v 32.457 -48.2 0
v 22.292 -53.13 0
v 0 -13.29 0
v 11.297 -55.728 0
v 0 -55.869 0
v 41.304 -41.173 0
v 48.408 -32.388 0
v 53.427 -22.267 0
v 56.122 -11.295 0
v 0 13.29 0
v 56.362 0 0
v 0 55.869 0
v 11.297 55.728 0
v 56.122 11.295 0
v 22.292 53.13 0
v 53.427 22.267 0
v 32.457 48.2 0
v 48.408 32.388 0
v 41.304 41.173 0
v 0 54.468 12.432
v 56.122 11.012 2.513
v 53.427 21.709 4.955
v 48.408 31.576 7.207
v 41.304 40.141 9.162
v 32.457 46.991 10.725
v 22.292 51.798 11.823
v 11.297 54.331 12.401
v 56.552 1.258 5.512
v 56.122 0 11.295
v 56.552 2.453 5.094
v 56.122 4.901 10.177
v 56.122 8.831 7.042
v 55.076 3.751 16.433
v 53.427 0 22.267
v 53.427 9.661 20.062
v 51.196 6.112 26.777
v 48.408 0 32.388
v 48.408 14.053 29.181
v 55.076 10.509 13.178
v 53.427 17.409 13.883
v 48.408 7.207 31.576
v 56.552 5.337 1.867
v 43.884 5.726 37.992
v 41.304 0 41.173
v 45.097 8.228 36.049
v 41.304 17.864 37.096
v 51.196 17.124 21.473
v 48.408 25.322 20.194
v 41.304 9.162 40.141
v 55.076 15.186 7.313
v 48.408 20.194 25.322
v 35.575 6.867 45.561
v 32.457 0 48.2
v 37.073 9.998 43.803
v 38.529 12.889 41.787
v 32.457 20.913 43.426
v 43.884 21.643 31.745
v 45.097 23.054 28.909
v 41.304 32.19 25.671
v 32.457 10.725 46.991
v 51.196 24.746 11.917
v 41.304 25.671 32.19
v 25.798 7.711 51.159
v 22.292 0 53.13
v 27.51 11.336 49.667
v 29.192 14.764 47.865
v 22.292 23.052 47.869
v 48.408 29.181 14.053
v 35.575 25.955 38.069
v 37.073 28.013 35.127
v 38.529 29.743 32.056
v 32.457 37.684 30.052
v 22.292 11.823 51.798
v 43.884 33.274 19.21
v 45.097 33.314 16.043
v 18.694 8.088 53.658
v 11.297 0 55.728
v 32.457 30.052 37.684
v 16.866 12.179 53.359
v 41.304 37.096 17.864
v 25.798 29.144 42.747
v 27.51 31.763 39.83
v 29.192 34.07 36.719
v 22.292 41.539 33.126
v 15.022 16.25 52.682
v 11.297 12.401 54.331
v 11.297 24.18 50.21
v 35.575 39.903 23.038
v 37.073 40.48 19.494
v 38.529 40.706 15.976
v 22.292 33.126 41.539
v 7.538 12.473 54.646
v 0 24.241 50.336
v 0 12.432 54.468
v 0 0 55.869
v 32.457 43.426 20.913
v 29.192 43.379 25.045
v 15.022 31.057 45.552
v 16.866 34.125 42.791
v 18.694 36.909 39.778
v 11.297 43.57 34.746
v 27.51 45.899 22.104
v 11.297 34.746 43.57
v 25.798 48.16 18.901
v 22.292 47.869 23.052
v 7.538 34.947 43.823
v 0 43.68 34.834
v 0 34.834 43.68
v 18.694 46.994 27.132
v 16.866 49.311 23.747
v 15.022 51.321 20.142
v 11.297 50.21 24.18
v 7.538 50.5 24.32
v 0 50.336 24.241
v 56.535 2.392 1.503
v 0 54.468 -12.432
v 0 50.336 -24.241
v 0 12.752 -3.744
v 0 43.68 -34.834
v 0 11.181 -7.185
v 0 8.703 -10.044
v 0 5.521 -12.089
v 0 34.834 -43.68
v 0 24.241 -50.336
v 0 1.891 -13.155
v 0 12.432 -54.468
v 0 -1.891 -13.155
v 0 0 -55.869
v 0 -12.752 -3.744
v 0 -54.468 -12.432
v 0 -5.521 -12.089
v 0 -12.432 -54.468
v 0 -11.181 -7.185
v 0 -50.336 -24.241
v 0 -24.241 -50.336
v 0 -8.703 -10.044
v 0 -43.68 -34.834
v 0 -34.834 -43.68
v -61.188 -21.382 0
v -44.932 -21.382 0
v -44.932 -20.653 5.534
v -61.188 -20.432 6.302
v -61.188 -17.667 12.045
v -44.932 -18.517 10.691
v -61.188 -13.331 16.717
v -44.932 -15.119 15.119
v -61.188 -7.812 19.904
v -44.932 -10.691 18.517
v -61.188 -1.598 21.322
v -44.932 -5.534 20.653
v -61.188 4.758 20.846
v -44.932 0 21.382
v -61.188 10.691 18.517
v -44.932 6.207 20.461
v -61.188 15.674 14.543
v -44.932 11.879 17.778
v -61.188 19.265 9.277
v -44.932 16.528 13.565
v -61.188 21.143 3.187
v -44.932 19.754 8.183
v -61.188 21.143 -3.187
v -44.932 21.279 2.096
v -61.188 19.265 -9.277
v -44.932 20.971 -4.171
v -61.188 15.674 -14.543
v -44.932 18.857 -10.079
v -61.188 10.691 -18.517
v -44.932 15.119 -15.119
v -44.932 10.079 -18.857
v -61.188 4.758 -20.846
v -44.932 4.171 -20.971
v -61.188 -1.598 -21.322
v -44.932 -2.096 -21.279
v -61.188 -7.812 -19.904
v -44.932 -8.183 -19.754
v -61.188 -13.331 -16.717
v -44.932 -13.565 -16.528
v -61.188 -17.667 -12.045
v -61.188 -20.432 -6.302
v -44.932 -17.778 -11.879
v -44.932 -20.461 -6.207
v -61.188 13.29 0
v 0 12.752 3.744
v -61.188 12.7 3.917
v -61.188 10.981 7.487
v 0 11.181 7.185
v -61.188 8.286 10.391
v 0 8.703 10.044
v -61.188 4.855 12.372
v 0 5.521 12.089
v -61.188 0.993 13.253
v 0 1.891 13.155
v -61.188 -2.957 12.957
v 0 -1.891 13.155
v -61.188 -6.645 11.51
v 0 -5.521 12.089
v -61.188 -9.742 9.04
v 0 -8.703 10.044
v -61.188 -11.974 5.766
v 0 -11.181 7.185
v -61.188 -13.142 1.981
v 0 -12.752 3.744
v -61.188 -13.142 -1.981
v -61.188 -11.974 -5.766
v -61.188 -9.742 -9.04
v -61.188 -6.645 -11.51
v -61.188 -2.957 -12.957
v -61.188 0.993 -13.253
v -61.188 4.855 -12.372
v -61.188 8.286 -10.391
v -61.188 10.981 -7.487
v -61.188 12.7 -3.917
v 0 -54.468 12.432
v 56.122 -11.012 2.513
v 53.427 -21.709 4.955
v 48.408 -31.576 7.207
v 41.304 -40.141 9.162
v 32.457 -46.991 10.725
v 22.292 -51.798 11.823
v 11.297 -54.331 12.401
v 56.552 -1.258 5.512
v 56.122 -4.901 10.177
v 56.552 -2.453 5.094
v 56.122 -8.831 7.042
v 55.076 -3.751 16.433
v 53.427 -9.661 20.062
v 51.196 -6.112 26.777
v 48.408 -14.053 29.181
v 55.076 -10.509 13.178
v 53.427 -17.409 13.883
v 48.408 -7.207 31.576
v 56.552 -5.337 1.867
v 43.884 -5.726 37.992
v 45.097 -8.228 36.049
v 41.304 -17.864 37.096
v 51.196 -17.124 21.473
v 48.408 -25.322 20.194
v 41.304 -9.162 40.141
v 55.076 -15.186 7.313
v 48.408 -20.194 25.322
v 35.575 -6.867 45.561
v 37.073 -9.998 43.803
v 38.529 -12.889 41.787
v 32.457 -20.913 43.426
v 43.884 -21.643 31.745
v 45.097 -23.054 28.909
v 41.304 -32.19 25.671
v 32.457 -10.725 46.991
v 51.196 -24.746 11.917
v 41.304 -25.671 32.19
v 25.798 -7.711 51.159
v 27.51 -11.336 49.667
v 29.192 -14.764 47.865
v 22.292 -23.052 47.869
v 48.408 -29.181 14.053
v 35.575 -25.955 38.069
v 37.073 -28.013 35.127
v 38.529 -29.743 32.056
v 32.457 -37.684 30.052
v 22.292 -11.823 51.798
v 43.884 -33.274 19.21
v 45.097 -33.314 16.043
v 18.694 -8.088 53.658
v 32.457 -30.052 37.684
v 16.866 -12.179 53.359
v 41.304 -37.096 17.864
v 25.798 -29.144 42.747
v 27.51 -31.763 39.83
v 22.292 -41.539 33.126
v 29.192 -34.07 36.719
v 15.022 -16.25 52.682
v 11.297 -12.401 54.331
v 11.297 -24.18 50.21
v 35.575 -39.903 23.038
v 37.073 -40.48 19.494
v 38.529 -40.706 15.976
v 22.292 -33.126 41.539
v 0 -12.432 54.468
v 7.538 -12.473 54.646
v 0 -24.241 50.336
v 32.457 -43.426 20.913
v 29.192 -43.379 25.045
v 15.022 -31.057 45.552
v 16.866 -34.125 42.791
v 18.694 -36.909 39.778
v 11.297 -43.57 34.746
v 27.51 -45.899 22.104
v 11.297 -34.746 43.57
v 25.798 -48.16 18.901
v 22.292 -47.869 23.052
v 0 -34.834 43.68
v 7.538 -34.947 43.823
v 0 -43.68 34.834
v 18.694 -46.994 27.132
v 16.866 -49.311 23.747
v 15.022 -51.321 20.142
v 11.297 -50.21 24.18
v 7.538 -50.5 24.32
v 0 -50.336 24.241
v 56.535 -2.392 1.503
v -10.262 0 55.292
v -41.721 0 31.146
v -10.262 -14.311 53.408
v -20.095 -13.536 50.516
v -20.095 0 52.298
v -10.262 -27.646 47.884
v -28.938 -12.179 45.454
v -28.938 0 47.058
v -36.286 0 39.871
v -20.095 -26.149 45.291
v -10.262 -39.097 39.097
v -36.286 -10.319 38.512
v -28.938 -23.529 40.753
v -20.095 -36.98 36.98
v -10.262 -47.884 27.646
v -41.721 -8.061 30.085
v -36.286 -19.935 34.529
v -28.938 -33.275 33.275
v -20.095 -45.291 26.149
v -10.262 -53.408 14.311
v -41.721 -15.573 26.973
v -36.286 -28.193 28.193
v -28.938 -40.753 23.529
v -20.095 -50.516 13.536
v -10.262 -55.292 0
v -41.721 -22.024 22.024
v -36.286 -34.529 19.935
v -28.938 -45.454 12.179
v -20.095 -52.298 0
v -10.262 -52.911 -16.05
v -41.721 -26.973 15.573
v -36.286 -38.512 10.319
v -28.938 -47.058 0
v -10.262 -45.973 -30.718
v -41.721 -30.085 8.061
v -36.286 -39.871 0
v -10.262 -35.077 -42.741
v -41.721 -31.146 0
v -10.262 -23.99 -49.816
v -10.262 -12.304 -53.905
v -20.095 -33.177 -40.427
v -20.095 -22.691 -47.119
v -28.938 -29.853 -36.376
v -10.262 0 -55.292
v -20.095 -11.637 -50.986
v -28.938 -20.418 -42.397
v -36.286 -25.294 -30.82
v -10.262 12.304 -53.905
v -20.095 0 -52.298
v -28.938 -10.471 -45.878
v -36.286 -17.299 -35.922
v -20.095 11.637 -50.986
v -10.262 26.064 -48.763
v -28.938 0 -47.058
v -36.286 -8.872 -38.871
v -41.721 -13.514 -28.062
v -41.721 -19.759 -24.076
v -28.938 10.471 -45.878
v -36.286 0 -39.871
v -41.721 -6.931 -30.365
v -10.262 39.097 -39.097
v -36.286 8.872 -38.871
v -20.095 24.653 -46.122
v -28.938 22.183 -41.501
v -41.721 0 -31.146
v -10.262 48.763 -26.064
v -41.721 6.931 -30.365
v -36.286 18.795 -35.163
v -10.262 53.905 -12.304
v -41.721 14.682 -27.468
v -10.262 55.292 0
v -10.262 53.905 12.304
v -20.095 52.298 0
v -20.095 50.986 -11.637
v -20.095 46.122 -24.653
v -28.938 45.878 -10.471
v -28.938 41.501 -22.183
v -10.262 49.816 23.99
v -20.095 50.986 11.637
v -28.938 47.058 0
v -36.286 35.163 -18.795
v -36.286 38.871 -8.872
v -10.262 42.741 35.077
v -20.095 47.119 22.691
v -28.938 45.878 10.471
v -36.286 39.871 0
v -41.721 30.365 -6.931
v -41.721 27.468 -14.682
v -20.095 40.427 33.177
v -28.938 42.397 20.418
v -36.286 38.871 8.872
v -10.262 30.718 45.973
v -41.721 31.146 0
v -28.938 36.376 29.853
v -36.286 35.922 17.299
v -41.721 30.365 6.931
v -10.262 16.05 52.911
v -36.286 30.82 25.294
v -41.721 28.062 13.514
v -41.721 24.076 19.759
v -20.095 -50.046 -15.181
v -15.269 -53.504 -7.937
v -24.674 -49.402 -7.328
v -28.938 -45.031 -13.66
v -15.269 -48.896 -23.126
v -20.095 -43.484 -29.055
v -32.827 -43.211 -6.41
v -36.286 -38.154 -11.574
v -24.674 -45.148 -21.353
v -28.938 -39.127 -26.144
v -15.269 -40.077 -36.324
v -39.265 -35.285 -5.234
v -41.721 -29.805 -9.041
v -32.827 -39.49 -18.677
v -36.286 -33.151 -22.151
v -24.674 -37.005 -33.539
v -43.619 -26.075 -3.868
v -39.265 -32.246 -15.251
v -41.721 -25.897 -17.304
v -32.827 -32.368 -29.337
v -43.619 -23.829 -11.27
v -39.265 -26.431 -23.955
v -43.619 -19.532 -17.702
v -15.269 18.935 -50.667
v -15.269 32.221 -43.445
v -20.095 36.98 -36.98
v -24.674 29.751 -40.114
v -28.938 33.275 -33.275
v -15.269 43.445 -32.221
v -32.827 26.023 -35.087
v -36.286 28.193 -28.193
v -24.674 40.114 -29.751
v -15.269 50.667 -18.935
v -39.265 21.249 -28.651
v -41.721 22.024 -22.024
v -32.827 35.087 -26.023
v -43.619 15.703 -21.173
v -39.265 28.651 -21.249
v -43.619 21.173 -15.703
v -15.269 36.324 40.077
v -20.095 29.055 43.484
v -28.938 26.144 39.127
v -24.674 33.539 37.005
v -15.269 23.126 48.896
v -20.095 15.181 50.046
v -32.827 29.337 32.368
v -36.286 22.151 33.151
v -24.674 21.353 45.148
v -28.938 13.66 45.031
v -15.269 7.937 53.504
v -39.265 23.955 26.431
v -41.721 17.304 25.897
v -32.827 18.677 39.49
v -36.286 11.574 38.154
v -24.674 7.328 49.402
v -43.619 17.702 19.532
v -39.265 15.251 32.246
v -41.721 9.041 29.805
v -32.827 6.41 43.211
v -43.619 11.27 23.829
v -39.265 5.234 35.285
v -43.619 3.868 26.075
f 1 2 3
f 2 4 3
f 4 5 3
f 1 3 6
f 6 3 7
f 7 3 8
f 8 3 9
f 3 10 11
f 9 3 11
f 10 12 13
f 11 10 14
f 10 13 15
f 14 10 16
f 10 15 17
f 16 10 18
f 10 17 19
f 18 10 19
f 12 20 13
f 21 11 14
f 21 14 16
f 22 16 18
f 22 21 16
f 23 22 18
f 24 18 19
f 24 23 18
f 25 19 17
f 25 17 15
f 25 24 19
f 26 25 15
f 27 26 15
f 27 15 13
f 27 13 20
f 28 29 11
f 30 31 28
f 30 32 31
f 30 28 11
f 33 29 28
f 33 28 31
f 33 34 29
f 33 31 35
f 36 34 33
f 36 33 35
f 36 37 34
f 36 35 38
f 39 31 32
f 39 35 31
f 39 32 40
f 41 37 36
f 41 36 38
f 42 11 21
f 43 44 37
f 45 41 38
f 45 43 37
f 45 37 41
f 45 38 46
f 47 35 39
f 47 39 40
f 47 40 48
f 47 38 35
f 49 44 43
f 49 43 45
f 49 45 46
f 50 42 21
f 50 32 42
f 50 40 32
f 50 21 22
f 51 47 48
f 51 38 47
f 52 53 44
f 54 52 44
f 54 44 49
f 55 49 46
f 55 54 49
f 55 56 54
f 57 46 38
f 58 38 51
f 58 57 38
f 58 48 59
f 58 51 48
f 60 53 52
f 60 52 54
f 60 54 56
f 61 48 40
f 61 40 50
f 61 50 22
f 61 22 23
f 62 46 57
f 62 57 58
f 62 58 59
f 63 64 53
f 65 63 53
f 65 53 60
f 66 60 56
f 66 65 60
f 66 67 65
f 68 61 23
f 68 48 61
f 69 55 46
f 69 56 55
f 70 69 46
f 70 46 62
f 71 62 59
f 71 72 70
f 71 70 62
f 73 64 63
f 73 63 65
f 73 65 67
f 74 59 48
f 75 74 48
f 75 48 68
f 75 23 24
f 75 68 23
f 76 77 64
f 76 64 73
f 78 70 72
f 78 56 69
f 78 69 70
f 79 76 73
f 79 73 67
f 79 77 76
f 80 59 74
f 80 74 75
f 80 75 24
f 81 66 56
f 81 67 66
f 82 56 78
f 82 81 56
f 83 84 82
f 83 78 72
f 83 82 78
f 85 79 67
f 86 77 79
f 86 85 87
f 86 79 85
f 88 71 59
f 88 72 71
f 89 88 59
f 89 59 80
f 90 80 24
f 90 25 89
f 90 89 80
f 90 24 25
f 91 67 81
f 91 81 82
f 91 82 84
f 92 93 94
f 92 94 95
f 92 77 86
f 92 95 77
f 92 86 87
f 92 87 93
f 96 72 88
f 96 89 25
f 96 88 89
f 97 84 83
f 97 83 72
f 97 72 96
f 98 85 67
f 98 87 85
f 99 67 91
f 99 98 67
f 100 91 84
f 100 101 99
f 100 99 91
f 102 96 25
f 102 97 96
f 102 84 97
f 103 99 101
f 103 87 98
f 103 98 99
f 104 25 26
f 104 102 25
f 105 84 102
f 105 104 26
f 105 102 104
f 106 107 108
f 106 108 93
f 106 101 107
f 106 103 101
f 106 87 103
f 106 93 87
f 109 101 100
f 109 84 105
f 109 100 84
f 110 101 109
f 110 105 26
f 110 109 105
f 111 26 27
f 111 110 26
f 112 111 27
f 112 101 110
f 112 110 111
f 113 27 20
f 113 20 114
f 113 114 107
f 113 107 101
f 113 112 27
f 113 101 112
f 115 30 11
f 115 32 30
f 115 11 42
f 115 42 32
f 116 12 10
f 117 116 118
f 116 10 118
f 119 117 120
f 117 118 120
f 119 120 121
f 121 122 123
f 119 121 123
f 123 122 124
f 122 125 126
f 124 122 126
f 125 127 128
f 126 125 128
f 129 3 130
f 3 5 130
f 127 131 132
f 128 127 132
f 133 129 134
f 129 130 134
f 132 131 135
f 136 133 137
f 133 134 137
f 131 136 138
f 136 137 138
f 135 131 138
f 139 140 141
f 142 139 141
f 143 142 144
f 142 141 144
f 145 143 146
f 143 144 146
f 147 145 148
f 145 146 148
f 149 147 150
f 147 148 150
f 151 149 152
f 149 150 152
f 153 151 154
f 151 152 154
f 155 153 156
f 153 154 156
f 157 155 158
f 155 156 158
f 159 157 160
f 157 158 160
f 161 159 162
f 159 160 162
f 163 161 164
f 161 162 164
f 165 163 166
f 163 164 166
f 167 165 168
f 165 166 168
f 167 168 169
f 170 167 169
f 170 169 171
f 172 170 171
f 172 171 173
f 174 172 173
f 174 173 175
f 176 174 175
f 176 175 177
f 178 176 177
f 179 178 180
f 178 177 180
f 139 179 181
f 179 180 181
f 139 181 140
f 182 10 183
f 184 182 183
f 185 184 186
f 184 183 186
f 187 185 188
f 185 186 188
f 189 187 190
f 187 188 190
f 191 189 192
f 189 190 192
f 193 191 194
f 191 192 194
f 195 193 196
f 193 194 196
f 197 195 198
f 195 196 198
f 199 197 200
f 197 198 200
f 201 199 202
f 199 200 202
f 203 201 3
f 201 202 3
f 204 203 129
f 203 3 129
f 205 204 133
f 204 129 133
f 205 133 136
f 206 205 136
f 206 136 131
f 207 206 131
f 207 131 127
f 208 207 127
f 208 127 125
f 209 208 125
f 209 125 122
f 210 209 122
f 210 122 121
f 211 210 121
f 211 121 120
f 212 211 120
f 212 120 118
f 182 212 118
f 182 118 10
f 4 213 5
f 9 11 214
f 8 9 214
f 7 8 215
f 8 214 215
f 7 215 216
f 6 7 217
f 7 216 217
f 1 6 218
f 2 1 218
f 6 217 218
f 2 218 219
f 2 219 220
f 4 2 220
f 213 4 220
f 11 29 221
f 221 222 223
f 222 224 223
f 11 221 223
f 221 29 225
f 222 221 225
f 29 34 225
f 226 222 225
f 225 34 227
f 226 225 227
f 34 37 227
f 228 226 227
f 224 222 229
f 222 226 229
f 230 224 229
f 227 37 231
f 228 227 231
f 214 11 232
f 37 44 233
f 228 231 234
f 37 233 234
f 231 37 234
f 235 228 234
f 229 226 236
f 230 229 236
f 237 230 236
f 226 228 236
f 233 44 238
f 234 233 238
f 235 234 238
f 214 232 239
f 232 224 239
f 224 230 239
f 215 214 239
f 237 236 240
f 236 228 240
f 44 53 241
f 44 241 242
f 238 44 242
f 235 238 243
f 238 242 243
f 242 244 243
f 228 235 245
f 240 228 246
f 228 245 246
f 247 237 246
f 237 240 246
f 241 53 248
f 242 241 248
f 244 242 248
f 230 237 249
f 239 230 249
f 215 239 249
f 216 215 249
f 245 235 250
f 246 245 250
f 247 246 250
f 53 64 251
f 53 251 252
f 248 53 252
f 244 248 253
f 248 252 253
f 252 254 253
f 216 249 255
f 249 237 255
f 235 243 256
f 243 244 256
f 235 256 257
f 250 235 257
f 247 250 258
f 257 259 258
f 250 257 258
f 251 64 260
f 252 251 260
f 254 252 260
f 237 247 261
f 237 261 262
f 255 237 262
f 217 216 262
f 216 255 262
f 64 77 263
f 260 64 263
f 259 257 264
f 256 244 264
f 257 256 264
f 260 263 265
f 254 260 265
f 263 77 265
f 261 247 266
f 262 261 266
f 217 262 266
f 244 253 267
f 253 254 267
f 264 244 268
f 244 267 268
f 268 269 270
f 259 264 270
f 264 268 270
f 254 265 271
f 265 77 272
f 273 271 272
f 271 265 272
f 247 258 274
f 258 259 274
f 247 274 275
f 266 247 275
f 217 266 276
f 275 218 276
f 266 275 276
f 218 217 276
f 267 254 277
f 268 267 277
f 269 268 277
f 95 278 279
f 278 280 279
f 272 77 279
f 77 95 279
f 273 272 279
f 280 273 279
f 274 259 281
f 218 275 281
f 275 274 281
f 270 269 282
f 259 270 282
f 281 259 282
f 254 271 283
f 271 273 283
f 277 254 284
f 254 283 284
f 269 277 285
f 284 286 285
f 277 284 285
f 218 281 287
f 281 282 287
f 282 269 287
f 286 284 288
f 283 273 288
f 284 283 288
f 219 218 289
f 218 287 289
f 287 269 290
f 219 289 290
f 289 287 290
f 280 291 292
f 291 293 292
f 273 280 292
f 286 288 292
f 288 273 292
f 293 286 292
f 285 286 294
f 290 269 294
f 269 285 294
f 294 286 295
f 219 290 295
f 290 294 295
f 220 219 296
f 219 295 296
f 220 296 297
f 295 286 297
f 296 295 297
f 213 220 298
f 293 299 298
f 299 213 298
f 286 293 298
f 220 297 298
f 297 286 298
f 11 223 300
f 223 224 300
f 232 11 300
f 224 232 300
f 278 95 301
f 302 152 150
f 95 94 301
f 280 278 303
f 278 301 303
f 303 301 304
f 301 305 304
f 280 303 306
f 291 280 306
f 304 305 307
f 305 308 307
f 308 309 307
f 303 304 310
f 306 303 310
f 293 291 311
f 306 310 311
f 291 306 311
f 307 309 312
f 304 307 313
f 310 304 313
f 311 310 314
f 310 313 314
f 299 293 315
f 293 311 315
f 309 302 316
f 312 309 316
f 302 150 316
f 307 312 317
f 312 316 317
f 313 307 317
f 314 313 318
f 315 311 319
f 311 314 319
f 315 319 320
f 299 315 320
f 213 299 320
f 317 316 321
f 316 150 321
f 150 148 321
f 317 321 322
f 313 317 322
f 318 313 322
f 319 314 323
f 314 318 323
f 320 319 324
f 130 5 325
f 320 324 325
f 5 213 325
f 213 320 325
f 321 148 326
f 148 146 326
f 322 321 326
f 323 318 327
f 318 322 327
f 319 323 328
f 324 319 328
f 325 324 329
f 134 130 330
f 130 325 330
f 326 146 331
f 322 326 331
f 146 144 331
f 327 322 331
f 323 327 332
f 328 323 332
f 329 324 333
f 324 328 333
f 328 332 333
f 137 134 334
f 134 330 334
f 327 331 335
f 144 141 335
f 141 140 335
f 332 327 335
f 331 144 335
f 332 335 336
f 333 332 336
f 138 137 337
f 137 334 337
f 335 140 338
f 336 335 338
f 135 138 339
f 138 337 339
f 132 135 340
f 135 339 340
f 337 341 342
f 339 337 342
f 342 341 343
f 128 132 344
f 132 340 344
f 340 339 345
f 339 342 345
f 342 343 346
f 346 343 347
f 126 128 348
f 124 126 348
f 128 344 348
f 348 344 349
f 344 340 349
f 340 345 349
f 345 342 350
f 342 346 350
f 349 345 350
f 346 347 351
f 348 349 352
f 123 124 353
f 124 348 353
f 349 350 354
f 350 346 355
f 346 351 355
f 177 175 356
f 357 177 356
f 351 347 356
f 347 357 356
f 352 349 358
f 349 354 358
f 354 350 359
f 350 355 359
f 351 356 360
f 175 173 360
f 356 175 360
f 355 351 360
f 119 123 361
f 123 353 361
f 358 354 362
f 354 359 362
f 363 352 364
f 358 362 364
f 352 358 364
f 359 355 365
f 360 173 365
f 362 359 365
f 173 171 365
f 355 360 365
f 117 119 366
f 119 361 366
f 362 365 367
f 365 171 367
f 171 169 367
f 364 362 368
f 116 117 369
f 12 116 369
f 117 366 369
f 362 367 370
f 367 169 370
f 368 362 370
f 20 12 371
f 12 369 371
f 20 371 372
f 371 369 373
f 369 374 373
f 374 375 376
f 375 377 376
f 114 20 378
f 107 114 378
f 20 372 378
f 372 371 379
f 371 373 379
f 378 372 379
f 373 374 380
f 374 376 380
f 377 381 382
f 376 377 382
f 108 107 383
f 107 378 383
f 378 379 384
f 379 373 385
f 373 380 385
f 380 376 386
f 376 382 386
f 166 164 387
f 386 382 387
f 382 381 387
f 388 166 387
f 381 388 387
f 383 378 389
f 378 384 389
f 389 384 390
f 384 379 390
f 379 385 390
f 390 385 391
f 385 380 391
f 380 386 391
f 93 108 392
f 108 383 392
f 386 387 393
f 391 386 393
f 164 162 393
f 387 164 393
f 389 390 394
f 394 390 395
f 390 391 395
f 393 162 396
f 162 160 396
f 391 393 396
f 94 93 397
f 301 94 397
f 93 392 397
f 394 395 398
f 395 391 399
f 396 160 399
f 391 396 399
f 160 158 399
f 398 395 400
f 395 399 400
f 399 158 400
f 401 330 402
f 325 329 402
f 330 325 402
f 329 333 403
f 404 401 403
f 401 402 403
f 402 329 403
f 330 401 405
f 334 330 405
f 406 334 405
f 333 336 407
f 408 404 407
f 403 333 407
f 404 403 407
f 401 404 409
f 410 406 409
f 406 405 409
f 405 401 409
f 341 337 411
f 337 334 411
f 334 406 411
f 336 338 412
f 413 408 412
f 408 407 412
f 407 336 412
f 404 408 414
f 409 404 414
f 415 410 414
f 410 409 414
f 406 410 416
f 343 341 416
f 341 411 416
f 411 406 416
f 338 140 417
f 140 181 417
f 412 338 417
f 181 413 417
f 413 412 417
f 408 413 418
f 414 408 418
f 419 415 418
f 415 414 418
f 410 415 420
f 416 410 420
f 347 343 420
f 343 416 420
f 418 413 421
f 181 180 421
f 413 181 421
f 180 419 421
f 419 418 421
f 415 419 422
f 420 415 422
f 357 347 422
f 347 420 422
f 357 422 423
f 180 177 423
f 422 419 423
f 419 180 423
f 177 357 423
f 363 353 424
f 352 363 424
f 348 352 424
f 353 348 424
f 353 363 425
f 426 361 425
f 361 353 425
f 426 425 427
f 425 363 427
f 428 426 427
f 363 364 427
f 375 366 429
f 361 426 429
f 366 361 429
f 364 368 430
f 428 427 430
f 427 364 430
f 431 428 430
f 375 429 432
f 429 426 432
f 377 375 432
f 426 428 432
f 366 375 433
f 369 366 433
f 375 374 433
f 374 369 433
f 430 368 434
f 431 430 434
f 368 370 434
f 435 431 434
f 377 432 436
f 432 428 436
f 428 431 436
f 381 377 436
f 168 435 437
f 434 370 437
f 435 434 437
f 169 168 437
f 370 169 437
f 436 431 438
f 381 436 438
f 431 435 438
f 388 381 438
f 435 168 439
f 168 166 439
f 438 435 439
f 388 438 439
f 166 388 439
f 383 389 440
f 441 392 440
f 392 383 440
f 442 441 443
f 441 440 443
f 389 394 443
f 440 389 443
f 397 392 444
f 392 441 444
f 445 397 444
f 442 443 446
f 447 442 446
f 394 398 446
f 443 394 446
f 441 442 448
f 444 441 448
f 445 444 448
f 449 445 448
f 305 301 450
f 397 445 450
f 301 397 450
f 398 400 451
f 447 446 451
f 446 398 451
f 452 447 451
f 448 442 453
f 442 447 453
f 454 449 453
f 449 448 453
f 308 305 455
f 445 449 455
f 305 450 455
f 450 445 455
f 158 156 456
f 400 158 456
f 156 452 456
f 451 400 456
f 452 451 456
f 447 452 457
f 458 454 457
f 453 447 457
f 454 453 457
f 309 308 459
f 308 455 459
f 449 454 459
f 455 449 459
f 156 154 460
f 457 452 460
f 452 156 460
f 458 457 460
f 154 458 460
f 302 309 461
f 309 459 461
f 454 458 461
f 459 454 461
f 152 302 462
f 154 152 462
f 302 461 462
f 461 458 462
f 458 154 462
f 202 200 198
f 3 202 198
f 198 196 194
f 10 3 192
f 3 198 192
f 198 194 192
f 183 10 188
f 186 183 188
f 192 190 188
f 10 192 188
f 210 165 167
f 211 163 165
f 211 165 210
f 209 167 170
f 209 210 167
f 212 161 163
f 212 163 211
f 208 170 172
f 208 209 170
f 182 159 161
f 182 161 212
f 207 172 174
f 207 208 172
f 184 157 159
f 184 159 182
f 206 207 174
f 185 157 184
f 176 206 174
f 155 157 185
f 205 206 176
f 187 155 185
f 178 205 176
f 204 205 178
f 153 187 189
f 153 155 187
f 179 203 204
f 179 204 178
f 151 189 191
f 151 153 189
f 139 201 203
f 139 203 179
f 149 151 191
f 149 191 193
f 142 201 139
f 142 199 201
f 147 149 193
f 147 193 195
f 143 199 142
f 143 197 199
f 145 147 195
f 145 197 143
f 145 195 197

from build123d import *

# Parameters (mm, degrees)
F2_ANGLE  = 180
F1_FACE_R = 21.381984
F3_DEPTH  = 16.256
F4_R      = 13.290294
F5_DEPTH  = 115.57


with BuildPart() as f1:
    # F0 (on Front) → F1 (revolve)
    with BuildSketch(Plane.XZ):
        with BuildLine():
            Line((-44.931725, 21.381984), (-44.931725, 0))
            Line((-44.931725, 0), (0, 0))
            Line((0, 0), (0, 55.869054))
            ThreePointArc((0, 55.869054), (-28.937879, 47.057632), (-44.931725, 21.381984))
        make_face()
    revolve(axis=Axis((-22.465862, 0, 0), (1, 0, 0)))

    # F0 (on Front) → F2 (revolve, symmetric)
    with BuildSketch(Plane.XZ) as f2_sk:
        with BuildLine():
            Line((0, 55.869054), (0, 0))
            Line((0, 0), (56.361724, 0))
            ThreePointArc((56.361724, 0), (41.303803, 41.17319), (0, 55.869054))
        make_face()
    revolve(axis=Axis((28.180862, 0, 0), (1, 0, 0)), revolution_arc=F2_ANGLE / 2)
    revolve(f2_sk.sketch, axis=Axis((28.180862, 0, 0), (-1, 0, 0)), revolution_arc=F2_ANGLE / 2)

    # F1_face (on face) → F3 (join)
    with BuildSketch(Plane(origin=(-44.931725, 0, 0), x_dir=(0, -1, 0), z_dir=(-1, 0, 0))):
        Circle(F1_FACE_R)
    extrude(amount=F3_DEPTH)

    # F4 (on Right) → F5 (cut)
    with BuildSketch(Plane.YZ):
        Circle(F4_R)
    extrude(amount=-F5_DEPTH, mode=Mode.SUBTRACT)


solid = f1.part
